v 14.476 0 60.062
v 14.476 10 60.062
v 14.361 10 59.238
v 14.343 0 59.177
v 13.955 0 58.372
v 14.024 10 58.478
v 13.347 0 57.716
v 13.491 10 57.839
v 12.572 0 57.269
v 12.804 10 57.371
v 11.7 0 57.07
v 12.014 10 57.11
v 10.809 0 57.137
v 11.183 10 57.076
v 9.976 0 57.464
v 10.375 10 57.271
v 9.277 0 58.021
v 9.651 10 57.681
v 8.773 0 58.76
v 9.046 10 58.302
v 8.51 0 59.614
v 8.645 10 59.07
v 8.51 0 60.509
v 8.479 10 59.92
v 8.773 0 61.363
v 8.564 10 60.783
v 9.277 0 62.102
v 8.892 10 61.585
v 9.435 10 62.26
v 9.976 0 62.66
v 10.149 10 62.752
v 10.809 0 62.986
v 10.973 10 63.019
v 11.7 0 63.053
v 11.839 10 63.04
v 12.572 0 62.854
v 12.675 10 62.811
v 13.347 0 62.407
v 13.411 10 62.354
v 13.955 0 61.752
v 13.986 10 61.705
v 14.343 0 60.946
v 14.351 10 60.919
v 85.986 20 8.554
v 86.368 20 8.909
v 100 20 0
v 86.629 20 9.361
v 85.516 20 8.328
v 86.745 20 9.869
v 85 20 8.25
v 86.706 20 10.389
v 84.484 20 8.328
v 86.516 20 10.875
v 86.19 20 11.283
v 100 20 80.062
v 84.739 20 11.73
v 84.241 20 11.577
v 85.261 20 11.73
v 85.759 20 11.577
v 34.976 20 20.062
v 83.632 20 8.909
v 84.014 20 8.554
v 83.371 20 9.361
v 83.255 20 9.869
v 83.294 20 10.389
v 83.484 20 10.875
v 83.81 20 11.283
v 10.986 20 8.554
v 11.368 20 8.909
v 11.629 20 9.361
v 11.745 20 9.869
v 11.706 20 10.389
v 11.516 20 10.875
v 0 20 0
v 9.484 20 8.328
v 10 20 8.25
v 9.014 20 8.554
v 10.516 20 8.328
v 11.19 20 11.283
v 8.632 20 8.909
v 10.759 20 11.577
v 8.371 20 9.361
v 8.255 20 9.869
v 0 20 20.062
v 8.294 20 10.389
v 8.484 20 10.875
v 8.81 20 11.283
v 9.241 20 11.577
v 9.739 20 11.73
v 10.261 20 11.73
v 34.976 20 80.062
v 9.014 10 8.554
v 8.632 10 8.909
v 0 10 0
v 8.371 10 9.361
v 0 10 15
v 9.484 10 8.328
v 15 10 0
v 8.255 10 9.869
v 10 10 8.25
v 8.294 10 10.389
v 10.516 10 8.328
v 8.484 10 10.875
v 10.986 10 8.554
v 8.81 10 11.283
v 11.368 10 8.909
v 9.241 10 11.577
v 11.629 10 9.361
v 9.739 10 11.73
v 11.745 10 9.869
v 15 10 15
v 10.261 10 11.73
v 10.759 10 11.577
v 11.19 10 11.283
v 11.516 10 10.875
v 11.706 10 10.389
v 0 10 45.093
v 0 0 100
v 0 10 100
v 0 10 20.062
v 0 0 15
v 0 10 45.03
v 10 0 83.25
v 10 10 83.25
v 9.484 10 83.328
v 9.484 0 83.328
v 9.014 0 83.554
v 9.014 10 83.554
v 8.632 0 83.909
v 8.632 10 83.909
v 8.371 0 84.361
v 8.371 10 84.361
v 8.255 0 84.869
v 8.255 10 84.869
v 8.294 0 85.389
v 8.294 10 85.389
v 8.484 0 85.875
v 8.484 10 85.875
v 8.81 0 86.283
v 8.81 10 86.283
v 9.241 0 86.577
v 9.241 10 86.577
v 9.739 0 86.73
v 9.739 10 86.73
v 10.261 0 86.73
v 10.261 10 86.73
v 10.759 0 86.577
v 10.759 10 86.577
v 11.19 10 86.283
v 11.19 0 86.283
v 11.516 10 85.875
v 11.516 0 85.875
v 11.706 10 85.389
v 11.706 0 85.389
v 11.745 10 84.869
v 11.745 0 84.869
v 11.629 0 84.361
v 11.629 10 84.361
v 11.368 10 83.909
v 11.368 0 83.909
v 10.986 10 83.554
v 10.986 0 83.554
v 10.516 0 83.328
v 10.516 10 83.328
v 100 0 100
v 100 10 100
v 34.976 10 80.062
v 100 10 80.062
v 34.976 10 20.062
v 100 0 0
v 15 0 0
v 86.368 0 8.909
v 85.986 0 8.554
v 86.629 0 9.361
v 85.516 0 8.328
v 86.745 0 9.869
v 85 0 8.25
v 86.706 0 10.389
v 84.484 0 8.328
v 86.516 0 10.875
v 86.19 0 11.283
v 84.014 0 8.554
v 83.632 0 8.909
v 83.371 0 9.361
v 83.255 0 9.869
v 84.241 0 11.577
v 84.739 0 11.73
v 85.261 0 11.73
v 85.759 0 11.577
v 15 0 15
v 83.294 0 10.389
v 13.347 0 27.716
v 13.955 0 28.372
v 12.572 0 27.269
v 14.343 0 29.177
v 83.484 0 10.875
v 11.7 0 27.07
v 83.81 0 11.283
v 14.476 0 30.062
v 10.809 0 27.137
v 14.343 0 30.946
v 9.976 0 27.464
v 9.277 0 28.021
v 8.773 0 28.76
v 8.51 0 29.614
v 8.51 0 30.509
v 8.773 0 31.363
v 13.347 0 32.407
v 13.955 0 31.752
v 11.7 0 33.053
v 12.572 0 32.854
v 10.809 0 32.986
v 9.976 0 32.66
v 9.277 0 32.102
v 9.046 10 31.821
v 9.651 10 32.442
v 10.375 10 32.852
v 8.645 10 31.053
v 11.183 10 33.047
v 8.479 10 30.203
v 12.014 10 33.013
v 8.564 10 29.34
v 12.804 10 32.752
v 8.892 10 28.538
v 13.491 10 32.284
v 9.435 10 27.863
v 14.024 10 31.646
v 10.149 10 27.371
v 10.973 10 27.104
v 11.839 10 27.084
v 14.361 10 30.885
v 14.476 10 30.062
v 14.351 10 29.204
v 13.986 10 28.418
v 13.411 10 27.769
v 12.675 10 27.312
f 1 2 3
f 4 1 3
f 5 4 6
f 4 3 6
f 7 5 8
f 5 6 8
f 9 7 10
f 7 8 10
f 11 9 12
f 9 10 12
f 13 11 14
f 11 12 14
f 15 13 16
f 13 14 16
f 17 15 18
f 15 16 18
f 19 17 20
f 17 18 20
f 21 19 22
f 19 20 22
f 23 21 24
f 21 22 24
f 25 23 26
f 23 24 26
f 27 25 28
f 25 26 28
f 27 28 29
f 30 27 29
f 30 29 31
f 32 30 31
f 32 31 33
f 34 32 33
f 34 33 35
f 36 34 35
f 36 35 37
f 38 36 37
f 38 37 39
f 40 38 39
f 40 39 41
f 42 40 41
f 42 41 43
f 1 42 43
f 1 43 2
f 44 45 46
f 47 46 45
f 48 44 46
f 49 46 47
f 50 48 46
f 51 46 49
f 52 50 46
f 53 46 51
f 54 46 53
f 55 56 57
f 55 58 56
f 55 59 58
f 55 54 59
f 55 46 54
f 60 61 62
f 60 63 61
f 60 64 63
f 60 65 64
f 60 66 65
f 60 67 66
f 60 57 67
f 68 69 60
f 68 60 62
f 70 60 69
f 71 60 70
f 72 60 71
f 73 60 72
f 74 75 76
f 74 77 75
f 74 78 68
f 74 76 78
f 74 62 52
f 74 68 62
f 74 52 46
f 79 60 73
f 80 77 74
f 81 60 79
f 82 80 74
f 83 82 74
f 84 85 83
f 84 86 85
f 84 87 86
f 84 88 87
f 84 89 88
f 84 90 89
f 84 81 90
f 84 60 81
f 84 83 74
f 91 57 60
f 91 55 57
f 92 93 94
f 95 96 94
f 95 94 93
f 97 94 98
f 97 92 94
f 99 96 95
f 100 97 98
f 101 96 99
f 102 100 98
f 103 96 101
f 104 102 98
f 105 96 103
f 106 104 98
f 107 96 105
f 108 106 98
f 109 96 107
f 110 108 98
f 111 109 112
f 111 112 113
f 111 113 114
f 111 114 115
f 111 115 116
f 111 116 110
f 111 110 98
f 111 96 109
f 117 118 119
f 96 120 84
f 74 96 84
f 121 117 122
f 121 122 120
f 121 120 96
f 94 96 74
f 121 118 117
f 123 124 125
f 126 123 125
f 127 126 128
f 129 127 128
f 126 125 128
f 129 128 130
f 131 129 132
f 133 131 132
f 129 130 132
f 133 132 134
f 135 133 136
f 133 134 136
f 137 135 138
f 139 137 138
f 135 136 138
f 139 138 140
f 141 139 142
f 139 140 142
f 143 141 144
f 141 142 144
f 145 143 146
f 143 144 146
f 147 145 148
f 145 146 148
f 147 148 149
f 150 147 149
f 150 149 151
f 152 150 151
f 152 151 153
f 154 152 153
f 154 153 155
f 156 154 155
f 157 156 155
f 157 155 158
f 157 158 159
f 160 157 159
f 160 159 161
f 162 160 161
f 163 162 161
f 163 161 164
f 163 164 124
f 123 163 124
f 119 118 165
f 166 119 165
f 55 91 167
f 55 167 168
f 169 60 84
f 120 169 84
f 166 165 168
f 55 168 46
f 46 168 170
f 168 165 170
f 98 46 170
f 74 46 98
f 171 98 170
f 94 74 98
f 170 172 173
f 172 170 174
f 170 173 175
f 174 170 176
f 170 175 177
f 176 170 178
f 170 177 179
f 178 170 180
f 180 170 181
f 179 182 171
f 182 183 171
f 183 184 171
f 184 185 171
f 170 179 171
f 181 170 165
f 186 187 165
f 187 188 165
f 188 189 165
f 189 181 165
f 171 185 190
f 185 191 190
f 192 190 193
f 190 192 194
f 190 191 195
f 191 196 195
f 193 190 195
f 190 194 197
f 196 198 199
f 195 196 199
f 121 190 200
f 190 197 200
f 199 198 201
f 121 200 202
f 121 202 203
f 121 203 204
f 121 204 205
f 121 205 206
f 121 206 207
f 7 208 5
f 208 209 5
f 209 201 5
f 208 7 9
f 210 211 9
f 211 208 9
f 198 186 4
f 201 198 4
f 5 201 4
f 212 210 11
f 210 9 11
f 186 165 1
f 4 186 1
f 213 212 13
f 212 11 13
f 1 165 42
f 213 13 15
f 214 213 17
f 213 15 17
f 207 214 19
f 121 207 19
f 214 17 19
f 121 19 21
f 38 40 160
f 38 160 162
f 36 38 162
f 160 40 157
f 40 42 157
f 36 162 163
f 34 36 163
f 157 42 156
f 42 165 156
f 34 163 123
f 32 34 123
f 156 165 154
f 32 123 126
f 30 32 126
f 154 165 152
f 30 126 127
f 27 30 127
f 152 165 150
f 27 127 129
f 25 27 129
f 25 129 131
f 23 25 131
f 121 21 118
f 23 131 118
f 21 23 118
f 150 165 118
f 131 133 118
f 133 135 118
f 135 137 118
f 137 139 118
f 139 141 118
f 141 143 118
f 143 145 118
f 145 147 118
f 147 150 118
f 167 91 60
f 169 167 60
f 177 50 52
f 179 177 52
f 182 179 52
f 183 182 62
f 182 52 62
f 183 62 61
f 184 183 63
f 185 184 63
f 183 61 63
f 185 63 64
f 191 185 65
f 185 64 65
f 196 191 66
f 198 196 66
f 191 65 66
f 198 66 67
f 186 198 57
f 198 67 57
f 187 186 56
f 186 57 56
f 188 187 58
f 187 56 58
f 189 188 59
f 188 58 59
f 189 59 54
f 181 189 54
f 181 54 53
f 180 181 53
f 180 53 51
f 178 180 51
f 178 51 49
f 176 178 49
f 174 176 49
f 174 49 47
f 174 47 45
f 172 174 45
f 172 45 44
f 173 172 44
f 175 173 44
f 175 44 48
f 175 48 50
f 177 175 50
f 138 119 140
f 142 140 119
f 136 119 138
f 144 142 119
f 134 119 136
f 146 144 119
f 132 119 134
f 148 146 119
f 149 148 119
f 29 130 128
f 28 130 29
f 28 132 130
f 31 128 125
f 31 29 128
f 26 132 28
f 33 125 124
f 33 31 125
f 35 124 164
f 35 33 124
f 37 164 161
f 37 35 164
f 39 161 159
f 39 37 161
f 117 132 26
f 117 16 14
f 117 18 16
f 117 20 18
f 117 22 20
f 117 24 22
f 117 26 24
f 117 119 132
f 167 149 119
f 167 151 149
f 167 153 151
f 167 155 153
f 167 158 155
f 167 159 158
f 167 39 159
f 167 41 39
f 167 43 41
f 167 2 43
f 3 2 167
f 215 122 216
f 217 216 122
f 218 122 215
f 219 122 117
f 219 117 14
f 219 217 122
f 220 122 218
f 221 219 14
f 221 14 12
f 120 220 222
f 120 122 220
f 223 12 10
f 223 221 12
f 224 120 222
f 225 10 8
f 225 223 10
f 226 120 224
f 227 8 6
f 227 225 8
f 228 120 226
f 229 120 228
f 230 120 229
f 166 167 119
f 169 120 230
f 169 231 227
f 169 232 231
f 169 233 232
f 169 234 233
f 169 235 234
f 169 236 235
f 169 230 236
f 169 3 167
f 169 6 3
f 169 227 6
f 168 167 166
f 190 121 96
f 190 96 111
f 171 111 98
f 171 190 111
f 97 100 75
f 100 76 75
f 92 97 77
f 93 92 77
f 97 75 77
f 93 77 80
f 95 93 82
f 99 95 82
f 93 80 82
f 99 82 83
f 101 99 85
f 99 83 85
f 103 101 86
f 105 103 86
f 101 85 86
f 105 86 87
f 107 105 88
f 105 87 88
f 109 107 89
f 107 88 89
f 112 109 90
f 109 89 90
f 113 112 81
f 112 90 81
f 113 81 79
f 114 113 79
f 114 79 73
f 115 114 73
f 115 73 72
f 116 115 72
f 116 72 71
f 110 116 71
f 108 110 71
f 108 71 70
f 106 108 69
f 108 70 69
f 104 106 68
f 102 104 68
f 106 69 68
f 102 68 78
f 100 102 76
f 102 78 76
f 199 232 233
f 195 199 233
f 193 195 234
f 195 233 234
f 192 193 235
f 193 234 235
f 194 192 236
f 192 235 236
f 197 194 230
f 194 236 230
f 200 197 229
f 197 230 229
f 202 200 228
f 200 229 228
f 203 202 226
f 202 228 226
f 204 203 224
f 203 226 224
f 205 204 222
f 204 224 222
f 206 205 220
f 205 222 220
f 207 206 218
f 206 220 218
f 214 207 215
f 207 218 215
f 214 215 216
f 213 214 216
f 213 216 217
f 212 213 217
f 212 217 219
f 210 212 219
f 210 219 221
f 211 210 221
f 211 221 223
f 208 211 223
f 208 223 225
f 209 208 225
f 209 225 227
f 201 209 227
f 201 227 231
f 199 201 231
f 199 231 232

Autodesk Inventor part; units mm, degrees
ref_plane "YZ Plane" through (0, 0, 0) normal (1, 0, 0) x (0, 1, 0)
ref_plane "XZ Plane" through (0, 0, 0) normal (0, 1, 0) x (-1, 0, 0)
ref_plane "XY Plane" through (0, 0, 0) normal (0, 0, 1) x (1, 0, 0)
sketch "Boceto1" plane through (0, 0, 0) normal (0, 1, 0) x (-1, 0, 0)
  line L0 (100, 100) -> (-100, 100)
  line L1 (-100, 100) -> (-100, -100)
  line L2 (-100, -100) -> (100, -100)
  line L3 (100, -100) -> (100, 100)
  line L4 (100, 100) -> (-100, -100) construction
  line L5 (-100, 100) -> (100, -100) construction
  point P0 (0, 0)
  dimension "d0" = 200
  dimension "d1" = 200
extrude "Extrusión1" add sketch "Boceto1" along normal blind 20
sketch "Boceto2" plane through (0, 20, 0) normal (0, 1, 0) x (1, 0, 0)
  circle A0 centre (-11.5239, -30.0616) radius 3
  circle A1 centre (11.4761, -30.0616) radius 3
  circle A2 centre (-11.5239, -60.0616) radius 3
  circle A3 centre (11.4761, -60.0616) radius 3
  line L0 (-0.0239, -45.0616) -> (-35.0239, -45.0616)
  line L1 (-35.0239, -45.0616) -> (-35.0239, -80.0616)
  line L2 (-0.0239, -45.0616) -> (34.9761, -45.0616)
  line L3 (-11.5239, -30.0616) -> (11.4761, -60.0616)
  line L4 (-11.5239, -60.0616) -> (11.4761, -30.0616)
  line L5 (34.9761, -20.0616) -> (-35.0239, -20.0616)
  line L6 (-35.0239, -20.0616) -> (-35.0239, -80.0616)
  line L7 (34.9761, -80.0616) -> (34.9761, -20.0616)
  line L8 (-105, -100.0616) -> (105, -100.0616)
  line L9 (-105.0239, -80.0616) -> (104.9761, -80.0616)
  line L10 (-35.0239, -80.0616) -> (34.9761, -80.0616)
  line L11 (105, -100.0616) -> (95.8154, -100.0616)
  line L12 (-105.0239, -80.0616) -> (104.9761, -80.0616)
  line L13 (105, -80.0616) -> (-105, -80.0616)
  line L14 (-105, -100.0616) -> (105, -100.0616)
  line L15 (105, -90.0616) -> (94.0798, -90.0616)
  line L16 (-105, -100.0616) -> (105, -100.0616)
  line L17 (-105, -80.0616) -> (105, -80.0616)
  line L18 (105, -80.0616) -> (105, -100.0616)
  line L19 (105, -100.0616) -> (-105, -100.0616)
  line L20 (-105, -100.0616) -> (-105, -80.0616)
  line L21 (-100, 100) -> (-100, -100) projected
  line L22 (-100, -100) -> (100.4077, -100)
  point P0 (0, 0)
  point P1 (0, -10.0616)
  point P2 (0, -90.0616)
  point P3 (-0.0478, -80.0616)
  dimension "d4" = 20
  dimension "d5" = 20
  dimension "d6" = 30
  dimension "d7" = 30
  dimension "d8" = 20
  dimension "d9" = 35
  dimension "d10" = 35
  dimension "d11" = 60
extrude "Extrusión2" cut sketch "Boceto2" against normal blind 10
sketch "Boceto3" plane through (0, 20, 0) normal (0, 1, 0) x (1, 0, 0)
  circle A0 centre (-11.5239, -30.0616) radius 3 projected
  circle A1 centre (-11.5239, -30.0616) radius 3
  circle A2 centre (11.4761, -30.0616) radius 3 projected
  circle A3 centre (11.4761, -30.0616) radius 3
  circle A4 centre (11.4761, -60.0616) radius 3 projected
  circle A5 centre (11.4761, -60.0616) radius 3
  circle A6 centre (-11.5239, -60.0616) radius 3
  point P0 (0, 0)
extrude "Extrusión3" cut sketch "Boceto3" against normal blind 20
sketch "Boceto4" plane through (0, 20, 0) normal (0, 1, 0) x (1, 0, 0)
  circle A0 centre (-51.75, 78.25) radius 1.75
  line L0 (-50, 70) -> (-60, 70)
  line L1 (-60, 70) -> (-60, 80)
  line L2 (-60, 80) -> (-50, 80)
  line L3 (-50, 80) -> (-50, 70)
  line L4 (-50, 70) -> (-60, 80) construction
  line L5 (-60, 70) -> (-50, 80) construction
  line L6 (-105, 90) -> (-105, -90)
  circle A1 centre (-58.25, 71.75) radius 1.75
  line L7 (0, 90) -> (0, 77.3124)
  circle A2 centre (51.75, 78.25) radius 1.75
  line L8 (50, 70) -> (60, 70)
  line L9 (60, 70) -> (60, 80)
  line L10 (60, 80) -> (50, 80)
  line L11 (50, 80) -> (50, 70)
  line L12 (50, 70) -> (60, 80) construction
  line L13 (60, 70) -> (50, 80) construction
  circle A3 centre (58.25, 71.75) radius 1.75
  line L14 (100, 100) -> (-100, 100) projected
  line L15 (-100, 100) -> (-100, -80.0616) projected
  line L16 (100, -80.0616) -> (100, 100) projected
  point P0 (0, 0)
  point P1 (0, 0)
  point P2 (-60, 75)
  point P3 (60, 75)
  dimension "d16" = 3.5
  dimension "d18" = 1.75
  dimension "d19" = 1.75
  dimension "d20" = 1.75
  dimension "d21" = 1.75
  dimension "d22" = 10
  dimension "d23" = 10
  dimension "d25" = 20
  dimension "d26" = 40
  dimension "d27" = 40
hole "Agujero1" at (-58.25, 20, -71.75) at (-51.75, 20, -78.25) at (58.25, 20, -71.75) at (51.75, 20, -78.25) direction (0, -1, 0) diameter 3.5 end through all
sketch "Boceto5" plane through (0, 20, 0) normal (0, 1, 0) x (1, 0, 0)
  line L0 (0, 90) -> (0, 68.25)
  circle A0 centre (-51.75, 78.25) radius 1.75 projected
  line L1 (-50, 78.25) -> (-50, 100)
  circle A1 centre (-58.25, 71.75) radius 1.75 projected
  line L2 (-60, 71.75) -> (-60, 100)
  line L3 (-60, 100) -> (-70, 100)
  line L4 (-50, 100) -> (-40, 100)
  line L5 (-40, 100) -> (-40, 60)
  line L6 (-40, 60) -> (-70, 60)
  line L7 (-70, 60) -> (-70, 100)
  line L8 (-70, 100) -> (-40, 100)
  circle A2 centre (51.75, 78.25) radius 1.75
  line L9 (50, 78.25) -> (50, 100)
  circle A3 centre (58.25, 71.75) radius 1.75
  line L10 (60, 71.75) -> (60, 100)
  line L11 (60, 100) -> (70, 100)
  line L12 (50, 100) -> (40, 100)
  line L13 (40, 100) -> (40, 60)
  line L14 (40, 60) -> (70, 60)
  line L15 (70, 60) -> (70, 100)
  line L16 (70, 100) -> (40, 100)
  point P0 (0, 0)
  dimension "d38" = 10
  dimension "d39" = 10
  dimension "d40" = 40
extrude "Extrusión4" cut sketch "Boceto5" against normal blind 10
ref_plane "Plano de trabajo1" through (0, 0, -100) normal (-1, 0, 0) x (0, 0, 1)
ref_plane "Plano de trabajo2" through (100, 0, 0) normal (0, 0, -1) x (-1, 0, 0)
sketch "Boceto7" plane through (0, 0, 0) normal (0, -1, 0) x (1, 0, 0)
  circle A0 centre (10, -10) radius 1.75
  line L0 (6.803, 0) -> (14.6069, 0)
  line L1 (0, 0) -> (0, -4.8284)
  line L2 (0, 0) -> (20.0354, 0)
  circle A1 centre (10, 10) radius 1.75
  line L3 (0, 0) -> (0, 4.8284)
  circle A2 centre (-10, -10) radius 1.75
  circle A3 centre (-10, 10) radius 1.75
  dimension "d52" = 3.5
  dimension "d54" = 10
  dimension "d55" = 10
hole "Agujero2" at (10, 0, -10) at (10, 0, 10) at (-10, 0, 10) at (-10, 0, -10) direction (0, 1, 0) diameter 3.5 end through all
sketch "Boceto8" plane through (0, 0, 0) normal (0, -1, 0) x (1, 0, 0)
  line L0 (-15, 15) -> (15, 15)
  line L1 (15, 15) -> (15, -15)
  line L2 (15, -15) -> (-15, -15)
  line L3 (-15, -15) -> (-15, 15)
  line L4 (-15, 15) -> (15, -15) construction
  line L5 (15, 15) -> (-15, -15) construction
  point P0 (0, 0)
  dimension "d63" = 30
  dimension "d64" = 30
extrude "Extrusión5" cut sketch "Boceto8" against normal blind 10
sketch "Boceto9" plane through (0, 0, 0) normal (0, -1, 0) x (1, 0, 0)
  circle A0 centre (85, -10) radius 1.75
  line L0 (100, 100) -> (100, -100) projected
  line L1 (140, 0) -> (-140, 0) projected
  circle A1 centre (85, 10) radius 1.75
  line L2 (0, 0) -> (0, 9.4908)
  circle A2 centre (-85, -10) radius 1.75
  circle A3 centre (-85, 10) radius 1.75
  line L3 (0, 0) -> (6.3157, 6.3157)
  line L4 (0, 0) -> (8.9318, 0) construction
  circle A4 centre (10, 85) radius 1.75
  circle A5 centre (-10, -85) radius 1.75
  line L5 (0, 0) -> (5.9531, -5.9531)
  line L6 (0, 0) -> (8.419, 0) construction
  circle A6 centre (10, -85) radius 1.75
  circle A7 centre (-10, 85) radius 1.75
  dimension "d67" = 3.5
  dimension "d68" = 15
  dimension "d69" = 10
  dimension "d70" = 45
  dimension "d71" = 45
hole "Agujero3" at (-10, 0, 85) at (10, 0, 85) at (85, 0, 10) at (85, 0, -10) at (-85, 0, 10) at (-85, 0, -10) at (-10, 0, -85) at (10, 0, -85) direction (0, 1, 0) diameter 3.5 end through all
split "Dividir3" plane through (100, 0, 0) removes the side toward (0, 0, -1)
split "Dividir4" plane through (0, 0, -100) removes the side toward (-1, 0, 0)
properties part number "base_front_4"
